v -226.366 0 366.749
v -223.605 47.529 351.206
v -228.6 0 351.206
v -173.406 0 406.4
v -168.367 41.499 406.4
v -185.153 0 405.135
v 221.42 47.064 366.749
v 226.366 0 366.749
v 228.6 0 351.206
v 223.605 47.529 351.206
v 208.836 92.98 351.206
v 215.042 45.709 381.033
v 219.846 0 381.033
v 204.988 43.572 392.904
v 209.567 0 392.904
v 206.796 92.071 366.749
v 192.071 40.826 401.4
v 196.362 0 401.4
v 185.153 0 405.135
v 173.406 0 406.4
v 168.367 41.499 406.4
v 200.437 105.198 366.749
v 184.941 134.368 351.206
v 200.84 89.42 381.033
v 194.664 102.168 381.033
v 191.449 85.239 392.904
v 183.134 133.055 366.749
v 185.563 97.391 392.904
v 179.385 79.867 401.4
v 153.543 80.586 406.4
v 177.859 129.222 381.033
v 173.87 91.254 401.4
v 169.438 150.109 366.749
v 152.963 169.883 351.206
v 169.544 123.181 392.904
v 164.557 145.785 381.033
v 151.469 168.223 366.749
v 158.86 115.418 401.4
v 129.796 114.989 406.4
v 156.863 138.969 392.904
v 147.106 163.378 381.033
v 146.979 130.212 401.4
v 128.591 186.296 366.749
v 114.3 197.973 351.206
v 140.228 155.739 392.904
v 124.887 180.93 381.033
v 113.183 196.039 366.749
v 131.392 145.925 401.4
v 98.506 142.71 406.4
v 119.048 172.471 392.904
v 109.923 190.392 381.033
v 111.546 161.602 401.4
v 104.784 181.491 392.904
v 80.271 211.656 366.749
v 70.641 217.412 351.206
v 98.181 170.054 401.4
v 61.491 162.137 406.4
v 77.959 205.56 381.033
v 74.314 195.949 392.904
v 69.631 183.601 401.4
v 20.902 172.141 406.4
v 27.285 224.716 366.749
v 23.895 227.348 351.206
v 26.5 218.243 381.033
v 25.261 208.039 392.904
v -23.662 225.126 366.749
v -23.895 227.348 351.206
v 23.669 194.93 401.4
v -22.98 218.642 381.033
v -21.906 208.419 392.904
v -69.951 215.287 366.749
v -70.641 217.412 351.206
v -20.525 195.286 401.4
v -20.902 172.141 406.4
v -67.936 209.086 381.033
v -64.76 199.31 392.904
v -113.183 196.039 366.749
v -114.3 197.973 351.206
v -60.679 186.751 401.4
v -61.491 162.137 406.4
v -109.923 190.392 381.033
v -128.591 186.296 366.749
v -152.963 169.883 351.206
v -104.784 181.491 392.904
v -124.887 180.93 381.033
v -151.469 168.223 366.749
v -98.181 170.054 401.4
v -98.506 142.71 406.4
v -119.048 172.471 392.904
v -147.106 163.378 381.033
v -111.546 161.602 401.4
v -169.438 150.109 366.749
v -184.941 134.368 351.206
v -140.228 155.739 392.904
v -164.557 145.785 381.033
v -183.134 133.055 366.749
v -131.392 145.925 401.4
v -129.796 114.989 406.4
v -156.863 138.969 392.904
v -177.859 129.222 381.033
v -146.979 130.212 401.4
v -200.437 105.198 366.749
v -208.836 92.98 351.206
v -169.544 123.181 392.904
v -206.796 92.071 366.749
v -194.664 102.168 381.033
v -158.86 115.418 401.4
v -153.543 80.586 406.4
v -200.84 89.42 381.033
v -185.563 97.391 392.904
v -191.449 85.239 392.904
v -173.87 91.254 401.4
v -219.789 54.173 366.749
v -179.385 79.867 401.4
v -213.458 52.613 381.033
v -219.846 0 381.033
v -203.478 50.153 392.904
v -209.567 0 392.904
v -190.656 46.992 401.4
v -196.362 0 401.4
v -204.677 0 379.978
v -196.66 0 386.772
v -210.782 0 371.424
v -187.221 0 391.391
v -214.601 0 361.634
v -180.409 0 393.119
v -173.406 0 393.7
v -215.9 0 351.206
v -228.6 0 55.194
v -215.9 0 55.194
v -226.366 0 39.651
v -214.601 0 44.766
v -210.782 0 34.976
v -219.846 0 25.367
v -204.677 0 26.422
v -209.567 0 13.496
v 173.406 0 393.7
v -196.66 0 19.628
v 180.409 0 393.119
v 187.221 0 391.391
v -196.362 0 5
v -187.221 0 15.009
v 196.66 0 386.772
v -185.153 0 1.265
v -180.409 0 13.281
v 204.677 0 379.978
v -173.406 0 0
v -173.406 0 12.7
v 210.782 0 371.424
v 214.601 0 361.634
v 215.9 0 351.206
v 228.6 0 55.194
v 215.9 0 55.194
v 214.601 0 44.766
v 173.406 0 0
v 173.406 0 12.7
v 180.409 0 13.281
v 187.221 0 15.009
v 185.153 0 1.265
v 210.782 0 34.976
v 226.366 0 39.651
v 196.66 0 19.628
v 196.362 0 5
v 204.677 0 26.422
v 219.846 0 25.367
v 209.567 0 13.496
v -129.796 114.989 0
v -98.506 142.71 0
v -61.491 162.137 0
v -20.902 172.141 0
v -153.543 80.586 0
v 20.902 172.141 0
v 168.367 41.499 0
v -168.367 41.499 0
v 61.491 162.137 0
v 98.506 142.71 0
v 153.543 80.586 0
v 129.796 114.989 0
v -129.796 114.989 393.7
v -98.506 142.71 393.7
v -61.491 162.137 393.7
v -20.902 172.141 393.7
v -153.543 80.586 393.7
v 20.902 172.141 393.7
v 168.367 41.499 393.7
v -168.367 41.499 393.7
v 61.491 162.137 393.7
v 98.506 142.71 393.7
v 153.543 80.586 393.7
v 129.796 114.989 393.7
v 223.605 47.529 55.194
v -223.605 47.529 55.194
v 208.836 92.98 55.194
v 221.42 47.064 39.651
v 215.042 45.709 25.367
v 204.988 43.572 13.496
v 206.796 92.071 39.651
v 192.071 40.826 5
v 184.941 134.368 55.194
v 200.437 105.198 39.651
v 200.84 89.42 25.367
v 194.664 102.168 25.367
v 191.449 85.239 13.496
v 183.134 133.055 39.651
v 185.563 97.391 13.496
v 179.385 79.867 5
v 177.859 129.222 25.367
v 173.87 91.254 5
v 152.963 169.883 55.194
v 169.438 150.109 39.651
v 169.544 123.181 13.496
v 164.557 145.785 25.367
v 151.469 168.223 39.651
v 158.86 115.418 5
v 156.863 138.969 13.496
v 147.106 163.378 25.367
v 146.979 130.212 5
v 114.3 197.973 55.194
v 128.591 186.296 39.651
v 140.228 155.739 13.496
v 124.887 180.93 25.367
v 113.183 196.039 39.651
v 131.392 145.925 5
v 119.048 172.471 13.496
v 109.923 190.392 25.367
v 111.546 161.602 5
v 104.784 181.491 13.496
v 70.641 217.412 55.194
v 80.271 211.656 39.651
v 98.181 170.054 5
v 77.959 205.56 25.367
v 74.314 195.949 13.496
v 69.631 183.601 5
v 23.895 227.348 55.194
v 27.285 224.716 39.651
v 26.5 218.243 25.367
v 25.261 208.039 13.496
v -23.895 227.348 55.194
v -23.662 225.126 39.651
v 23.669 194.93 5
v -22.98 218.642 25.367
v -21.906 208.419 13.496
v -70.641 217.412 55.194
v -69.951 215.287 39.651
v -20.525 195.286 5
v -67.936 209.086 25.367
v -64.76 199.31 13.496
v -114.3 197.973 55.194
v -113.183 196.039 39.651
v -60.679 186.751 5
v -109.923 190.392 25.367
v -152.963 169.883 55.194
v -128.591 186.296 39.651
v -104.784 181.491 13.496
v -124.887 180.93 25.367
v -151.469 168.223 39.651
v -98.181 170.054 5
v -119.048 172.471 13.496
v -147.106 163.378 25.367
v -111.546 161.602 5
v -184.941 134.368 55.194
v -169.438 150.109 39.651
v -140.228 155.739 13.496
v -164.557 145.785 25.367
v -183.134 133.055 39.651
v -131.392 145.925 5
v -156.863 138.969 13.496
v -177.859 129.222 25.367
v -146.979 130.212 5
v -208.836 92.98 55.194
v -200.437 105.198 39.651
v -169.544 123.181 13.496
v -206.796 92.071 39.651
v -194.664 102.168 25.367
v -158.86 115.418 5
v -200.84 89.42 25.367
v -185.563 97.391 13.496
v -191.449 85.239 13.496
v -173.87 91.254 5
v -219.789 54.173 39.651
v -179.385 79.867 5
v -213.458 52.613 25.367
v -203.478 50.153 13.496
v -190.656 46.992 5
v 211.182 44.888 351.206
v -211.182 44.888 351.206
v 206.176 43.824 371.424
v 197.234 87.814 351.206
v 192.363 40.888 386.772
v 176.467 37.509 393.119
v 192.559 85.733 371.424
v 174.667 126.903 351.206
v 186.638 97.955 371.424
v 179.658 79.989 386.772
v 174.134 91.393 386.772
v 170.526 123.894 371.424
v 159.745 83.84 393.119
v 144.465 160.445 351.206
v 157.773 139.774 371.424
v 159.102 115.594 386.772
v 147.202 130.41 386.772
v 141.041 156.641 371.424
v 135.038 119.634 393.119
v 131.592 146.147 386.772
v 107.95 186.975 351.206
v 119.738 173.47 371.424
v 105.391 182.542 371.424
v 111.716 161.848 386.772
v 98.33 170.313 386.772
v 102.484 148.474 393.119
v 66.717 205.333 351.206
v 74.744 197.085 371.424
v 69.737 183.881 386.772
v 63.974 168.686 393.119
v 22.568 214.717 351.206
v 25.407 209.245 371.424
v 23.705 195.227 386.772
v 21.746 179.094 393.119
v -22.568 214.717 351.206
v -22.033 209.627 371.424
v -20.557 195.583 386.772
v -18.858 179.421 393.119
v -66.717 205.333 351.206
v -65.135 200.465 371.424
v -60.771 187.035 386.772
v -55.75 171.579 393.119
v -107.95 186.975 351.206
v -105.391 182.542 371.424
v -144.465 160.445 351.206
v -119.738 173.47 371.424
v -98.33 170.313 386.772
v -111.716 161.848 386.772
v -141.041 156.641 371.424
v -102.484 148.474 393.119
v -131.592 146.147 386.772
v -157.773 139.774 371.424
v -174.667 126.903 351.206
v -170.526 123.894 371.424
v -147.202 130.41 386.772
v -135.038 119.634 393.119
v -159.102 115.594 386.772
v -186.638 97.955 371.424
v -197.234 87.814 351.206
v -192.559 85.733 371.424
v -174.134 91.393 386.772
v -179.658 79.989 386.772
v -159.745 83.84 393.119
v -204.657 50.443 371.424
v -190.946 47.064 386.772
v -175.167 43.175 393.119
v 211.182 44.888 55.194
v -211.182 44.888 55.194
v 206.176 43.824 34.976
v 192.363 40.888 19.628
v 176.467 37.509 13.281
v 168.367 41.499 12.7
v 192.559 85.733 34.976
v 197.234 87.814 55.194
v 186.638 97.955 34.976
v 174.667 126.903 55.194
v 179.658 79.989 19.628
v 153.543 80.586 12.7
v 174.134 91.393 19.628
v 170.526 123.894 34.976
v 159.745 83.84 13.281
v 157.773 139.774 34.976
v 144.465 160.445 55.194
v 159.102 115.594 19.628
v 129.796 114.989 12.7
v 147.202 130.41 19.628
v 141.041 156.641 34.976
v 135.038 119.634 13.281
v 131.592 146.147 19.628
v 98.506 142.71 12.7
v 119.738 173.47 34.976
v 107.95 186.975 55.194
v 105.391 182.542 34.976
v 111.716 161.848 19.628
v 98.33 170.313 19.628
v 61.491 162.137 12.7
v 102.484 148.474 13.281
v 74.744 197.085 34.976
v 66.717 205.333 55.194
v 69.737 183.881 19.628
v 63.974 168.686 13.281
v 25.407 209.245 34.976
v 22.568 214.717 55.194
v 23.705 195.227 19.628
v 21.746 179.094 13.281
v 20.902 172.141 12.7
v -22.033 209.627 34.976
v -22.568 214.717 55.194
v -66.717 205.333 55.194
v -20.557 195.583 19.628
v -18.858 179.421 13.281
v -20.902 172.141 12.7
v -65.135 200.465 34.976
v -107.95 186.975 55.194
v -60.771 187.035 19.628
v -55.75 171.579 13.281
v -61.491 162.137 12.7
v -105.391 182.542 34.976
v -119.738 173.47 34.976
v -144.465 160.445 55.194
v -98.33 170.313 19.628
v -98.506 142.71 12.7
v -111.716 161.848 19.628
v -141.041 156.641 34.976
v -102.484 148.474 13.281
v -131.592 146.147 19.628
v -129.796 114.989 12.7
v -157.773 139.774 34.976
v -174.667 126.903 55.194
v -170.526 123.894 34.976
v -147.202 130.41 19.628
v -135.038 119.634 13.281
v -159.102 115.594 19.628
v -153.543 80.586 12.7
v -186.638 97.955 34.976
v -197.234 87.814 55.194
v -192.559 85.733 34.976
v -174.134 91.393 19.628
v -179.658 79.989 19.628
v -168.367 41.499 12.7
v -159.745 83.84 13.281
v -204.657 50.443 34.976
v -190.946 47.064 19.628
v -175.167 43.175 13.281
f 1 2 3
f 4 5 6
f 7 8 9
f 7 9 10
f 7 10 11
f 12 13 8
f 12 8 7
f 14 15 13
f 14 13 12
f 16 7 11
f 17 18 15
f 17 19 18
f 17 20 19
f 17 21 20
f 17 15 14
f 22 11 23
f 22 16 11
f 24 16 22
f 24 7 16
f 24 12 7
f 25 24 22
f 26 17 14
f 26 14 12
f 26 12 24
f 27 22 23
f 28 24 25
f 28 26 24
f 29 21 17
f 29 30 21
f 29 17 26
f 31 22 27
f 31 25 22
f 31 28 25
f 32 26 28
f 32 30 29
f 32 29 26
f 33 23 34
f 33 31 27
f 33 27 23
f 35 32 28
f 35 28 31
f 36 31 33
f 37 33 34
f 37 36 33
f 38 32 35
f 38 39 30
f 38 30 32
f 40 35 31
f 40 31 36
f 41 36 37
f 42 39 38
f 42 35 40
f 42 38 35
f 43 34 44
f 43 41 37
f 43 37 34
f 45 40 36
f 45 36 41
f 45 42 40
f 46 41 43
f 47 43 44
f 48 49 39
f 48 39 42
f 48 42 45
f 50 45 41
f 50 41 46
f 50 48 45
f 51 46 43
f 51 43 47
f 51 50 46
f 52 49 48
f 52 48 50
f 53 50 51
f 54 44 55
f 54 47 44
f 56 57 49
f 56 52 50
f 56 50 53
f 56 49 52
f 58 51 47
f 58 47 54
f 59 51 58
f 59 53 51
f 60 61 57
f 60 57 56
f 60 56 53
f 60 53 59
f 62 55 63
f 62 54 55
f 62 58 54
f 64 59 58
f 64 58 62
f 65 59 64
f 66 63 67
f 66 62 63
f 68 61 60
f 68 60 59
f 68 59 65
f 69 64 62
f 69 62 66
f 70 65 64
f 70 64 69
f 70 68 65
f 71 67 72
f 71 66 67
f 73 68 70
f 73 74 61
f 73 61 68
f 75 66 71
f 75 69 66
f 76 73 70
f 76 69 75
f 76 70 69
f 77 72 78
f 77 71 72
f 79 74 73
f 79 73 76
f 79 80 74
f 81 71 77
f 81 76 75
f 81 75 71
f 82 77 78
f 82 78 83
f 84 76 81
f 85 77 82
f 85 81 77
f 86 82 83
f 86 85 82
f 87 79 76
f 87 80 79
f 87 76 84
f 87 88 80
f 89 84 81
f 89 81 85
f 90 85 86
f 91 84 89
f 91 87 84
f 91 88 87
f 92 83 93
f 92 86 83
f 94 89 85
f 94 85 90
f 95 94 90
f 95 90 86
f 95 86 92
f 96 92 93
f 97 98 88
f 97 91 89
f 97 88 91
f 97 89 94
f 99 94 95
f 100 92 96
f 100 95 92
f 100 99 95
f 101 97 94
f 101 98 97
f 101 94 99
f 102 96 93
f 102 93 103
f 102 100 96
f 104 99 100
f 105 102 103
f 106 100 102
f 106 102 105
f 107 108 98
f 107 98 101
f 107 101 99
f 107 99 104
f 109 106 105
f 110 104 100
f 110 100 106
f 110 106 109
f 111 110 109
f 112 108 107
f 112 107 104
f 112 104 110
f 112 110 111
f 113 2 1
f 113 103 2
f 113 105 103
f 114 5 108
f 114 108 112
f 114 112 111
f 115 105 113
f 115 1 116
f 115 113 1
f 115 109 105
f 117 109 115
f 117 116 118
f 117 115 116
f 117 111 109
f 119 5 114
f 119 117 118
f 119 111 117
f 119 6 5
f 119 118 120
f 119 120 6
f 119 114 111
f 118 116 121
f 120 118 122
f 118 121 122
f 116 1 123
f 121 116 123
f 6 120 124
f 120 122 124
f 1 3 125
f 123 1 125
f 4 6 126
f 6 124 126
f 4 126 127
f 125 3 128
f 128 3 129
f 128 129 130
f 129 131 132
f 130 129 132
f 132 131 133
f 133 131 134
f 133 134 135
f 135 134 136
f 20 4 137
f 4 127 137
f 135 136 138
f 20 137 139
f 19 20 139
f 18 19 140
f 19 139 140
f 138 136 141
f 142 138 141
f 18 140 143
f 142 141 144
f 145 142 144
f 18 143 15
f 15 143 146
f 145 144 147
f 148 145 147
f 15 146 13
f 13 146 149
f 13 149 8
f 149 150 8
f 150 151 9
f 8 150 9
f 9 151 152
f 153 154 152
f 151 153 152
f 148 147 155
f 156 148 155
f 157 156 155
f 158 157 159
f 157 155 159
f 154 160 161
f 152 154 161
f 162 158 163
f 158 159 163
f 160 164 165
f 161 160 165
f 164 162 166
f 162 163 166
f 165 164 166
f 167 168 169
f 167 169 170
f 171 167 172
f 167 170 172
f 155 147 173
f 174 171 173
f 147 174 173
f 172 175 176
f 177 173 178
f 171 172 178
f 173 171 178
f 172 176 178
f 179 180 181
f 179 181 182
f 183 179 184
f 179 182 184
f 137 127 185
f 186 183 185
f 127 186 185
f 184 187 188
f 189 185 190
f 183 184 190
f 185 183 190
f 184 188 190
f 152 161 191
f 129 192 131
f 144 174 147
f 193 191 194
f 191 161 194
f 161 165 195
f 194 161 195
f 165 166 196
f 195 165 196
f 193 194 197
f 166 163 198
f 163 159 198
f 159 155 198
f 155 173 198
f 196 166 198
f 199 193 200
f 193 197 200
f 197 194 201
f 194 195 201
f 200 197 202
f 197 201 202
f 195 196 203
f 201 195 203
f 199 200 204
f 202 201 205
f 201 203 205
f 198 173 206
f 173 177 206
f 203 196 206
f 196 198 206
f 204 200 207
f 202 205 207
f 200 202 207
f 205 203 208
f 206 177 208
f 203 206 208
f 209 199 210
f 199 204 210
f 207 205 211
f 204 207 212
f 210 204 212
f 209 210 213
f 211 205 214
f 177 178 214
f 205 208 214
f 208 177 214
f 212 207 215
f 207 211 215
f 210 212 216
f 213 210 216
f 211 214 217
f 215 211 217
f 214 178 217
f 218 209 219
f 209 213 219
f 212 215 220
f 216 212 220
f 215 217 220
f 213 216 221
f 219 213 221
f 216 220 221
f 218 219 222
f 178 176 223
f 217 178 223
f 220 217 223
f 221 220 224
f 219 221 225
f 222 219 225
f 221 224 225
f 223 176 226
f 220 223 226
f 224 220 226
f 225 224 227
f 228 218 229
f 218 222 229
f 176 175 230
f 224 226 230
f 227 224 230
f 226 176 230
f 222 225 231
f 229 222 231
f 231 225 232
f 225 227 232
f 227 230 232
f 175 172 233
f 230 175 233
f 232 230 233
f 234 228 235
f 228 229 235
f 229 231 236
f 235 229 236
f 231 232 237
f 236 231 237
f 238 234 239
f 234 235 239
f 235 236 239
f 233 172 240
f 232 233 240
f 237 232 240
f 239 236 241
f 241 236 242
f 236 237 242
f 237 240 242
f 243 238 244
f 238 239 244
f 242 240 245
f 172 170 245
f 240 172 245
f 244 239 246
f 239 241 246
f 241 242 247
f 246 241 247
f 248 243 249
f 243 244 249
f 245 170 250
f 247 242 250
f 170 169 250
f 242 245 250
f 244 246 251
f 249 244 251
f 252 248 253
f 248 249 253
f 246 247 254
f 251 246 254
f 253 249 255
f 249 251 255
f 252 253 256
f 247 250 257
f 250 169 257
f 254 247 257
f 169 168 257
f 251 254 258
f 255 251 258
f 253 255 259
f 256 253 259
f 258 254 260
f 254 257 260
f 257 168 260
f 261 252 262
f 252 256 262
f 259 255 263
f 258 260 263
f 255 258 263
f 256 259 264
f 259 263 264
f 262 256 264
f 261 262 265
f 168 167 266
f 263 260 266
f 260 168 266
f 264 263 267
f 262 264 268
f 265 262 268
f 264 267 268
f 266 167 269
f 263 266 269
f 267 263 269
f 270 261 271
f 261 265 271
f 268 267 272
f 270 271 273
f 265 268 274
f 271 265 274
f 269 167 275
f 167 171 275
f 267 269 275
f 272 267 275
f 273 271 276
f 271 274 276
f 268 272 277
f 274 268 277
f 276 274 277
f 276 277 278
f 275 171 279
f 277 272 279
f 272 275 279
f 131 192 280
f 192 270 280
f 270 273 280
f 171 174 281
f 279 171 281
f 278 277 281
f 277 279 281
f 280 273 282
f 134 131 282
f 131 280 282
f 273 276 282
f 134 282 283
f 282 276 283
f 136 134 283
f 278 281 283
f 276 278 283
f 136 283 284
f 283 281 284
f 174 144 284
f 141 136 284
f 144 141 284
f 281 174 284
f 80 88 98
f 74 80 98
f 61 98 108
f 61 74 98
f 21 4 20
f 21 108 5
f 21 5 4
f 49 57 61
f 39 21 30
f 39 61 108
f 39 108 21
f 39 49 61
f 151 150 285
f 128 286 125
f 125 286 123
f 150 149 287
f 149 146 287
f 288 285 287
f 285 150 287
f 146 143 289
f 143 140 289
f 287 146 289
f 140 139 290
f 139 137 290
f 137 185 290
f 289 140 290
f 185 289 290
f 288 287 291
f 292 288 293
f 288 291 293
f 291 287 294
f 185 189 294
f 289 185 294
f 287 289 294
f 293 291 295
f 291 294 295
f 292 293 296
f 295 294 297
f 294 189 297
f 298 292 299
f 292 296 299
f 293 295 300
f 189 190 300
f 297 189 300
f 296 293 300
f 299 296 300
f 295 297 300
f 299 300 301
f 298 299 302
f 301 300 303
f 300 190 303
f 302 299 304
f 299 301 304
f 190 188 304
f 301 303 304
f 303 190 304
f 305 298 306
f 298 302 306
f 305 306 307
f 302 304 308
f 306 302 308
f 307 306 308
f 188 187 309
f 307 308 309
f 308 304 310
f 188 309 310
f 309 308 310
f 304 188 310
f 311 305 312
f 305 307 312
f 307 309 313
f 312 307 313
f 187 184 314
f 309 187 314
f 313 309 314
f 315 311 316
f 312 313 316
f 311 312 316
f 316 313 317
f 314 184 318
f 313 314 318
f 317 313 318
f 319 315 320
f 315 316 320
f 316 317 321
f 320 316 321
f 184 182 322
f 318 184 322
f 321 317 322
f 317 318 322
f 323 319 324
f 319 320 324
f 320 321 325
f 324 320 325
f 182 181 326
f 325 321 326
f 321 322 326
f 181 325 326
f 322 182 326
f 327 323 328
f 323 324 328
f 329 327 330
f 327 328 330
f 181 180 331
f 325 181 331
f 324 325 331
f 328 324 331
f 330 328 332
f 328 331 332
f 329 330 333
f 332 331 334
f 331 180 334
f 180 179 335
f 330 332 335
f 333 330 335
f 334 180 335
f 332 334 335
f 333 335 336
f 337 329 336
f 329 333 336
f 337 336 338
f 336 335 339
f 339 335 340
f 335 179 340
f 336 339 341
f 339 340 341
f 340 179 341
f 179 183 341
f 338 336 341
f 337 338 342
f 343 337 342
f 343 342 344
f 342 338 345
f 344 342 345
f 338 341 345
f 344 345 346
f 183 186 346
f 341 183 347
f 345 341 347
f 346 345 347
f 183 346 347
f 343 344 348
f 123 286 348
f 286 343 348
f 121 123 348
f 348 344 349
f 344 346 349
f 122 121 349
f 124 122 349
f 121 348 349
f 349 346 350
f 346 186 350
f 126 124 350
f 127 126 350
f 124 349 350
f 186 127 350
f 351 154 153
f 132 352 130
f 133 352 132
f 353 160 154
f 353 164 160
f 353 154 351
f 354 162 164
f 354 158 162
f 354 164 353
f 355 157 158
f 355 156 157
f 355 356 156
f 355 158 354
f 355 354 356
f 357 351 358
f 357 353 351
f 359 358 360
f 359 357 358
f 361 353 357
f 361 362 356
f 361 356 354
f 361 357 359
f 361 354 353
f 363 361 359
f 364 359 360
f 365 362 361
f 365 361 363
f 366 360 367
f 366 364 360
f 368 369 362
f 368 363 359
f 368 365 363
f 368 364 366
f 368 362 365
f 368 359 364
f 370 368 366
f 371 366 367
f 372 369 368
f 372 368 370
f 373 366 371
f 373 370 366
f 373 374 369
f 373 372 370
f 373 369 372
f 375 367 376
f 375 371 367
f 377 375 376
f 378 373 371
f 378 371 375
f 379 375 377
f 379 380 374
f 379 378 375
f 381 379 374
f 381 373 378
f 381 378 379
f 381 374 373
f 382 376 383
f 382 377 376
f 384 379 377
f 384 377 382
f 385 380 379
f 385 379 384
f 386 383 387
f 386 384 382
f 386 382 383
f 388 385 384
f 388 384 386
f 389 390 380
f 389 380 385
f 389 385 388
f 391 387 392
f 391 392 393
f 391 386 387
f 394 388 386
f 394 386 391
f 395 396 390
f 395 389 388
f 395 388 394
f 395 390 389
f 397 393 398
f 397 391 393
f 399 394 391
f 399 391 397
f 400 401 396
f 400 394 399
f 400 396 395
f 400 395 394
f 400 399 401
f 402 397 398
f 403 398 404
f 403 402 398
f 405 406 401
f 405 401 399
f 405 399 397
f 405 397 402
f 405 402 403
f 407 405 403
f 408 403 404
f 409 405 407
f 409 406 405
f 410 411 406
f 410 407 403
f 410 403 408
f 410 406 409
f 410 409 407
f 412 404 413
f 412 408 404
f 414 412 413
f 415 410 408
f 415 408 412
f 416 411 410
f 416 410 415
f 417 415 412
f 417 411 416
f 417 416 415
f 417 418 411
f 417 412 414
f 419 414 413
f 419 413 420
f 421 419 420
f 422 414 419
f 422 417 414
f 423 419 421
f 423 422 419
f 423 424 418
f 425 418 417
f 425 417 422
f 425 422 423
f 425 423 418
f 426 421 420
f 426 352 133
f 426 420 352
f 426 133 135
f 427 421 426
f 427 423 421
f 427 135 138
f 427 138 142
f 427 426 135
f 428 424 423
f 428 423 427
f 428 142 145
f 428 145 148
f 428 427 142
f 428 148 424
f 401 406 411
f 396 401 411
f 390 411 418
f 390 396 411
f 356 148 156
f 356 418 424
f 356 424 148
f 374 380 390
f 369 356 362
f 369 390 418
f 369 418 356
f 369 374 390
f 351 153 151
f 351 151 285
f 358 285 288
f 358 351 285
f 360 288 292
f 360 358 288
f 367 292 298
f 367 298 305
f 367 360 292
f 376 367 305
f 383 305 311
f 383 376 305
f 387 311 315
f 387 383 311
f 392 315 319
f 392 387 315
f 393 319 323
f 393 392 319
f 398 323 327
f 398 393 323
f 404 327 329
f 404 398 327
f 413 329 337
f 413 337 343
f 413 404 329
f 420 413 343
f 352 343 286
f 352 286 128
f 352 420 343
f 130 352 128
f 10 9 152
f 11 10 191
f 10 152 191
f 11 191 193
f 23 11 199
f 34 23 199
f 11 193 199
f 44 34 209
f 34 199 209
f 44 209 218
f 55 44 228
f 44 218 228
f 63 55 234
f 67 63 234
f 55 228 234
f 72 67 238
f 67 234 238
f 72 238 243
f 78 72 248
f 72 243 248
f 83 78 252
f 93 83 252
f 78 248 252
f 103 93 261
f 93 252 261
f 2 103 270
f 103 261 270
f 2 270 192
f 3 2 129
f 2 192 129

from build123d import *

# Parameters (mm, degrees)
F1_DEPTH = 406.4
F2_R     = 55.1942
F4_T     = -12.7


# Not quite as in the source:
# - two fillets or chamfers of one size are made in one step


with BuildPart() as f1:
    # F0 (on Top) → F1 (new body)
    with BuildSketch(Plane.XY):
        with BuildLine():
            ThreePointArc((228.6, 0), (0, 228.6), (-228.6, 0))
            Line((-228.6, 0), (228.6, 0))
        make_face()
    extrude(amount=F1_DEPTH)

    # F2
    f2_edges = [f1.edges().sort_by_distance(p)[0] for p in [
        (0, 228.6, 406.4),
        (0, 228.6, 0),
    ]]
    fillet(f2_edges, radius=F2_R)

    # F4
    f4_openings = [f1.faces().sort_by_distance(p)[0] for p in [
        (0, 0, 203.2),
    ]]
    offset(amount=F4_T, openings=f4_openings)


solid = f1.part
